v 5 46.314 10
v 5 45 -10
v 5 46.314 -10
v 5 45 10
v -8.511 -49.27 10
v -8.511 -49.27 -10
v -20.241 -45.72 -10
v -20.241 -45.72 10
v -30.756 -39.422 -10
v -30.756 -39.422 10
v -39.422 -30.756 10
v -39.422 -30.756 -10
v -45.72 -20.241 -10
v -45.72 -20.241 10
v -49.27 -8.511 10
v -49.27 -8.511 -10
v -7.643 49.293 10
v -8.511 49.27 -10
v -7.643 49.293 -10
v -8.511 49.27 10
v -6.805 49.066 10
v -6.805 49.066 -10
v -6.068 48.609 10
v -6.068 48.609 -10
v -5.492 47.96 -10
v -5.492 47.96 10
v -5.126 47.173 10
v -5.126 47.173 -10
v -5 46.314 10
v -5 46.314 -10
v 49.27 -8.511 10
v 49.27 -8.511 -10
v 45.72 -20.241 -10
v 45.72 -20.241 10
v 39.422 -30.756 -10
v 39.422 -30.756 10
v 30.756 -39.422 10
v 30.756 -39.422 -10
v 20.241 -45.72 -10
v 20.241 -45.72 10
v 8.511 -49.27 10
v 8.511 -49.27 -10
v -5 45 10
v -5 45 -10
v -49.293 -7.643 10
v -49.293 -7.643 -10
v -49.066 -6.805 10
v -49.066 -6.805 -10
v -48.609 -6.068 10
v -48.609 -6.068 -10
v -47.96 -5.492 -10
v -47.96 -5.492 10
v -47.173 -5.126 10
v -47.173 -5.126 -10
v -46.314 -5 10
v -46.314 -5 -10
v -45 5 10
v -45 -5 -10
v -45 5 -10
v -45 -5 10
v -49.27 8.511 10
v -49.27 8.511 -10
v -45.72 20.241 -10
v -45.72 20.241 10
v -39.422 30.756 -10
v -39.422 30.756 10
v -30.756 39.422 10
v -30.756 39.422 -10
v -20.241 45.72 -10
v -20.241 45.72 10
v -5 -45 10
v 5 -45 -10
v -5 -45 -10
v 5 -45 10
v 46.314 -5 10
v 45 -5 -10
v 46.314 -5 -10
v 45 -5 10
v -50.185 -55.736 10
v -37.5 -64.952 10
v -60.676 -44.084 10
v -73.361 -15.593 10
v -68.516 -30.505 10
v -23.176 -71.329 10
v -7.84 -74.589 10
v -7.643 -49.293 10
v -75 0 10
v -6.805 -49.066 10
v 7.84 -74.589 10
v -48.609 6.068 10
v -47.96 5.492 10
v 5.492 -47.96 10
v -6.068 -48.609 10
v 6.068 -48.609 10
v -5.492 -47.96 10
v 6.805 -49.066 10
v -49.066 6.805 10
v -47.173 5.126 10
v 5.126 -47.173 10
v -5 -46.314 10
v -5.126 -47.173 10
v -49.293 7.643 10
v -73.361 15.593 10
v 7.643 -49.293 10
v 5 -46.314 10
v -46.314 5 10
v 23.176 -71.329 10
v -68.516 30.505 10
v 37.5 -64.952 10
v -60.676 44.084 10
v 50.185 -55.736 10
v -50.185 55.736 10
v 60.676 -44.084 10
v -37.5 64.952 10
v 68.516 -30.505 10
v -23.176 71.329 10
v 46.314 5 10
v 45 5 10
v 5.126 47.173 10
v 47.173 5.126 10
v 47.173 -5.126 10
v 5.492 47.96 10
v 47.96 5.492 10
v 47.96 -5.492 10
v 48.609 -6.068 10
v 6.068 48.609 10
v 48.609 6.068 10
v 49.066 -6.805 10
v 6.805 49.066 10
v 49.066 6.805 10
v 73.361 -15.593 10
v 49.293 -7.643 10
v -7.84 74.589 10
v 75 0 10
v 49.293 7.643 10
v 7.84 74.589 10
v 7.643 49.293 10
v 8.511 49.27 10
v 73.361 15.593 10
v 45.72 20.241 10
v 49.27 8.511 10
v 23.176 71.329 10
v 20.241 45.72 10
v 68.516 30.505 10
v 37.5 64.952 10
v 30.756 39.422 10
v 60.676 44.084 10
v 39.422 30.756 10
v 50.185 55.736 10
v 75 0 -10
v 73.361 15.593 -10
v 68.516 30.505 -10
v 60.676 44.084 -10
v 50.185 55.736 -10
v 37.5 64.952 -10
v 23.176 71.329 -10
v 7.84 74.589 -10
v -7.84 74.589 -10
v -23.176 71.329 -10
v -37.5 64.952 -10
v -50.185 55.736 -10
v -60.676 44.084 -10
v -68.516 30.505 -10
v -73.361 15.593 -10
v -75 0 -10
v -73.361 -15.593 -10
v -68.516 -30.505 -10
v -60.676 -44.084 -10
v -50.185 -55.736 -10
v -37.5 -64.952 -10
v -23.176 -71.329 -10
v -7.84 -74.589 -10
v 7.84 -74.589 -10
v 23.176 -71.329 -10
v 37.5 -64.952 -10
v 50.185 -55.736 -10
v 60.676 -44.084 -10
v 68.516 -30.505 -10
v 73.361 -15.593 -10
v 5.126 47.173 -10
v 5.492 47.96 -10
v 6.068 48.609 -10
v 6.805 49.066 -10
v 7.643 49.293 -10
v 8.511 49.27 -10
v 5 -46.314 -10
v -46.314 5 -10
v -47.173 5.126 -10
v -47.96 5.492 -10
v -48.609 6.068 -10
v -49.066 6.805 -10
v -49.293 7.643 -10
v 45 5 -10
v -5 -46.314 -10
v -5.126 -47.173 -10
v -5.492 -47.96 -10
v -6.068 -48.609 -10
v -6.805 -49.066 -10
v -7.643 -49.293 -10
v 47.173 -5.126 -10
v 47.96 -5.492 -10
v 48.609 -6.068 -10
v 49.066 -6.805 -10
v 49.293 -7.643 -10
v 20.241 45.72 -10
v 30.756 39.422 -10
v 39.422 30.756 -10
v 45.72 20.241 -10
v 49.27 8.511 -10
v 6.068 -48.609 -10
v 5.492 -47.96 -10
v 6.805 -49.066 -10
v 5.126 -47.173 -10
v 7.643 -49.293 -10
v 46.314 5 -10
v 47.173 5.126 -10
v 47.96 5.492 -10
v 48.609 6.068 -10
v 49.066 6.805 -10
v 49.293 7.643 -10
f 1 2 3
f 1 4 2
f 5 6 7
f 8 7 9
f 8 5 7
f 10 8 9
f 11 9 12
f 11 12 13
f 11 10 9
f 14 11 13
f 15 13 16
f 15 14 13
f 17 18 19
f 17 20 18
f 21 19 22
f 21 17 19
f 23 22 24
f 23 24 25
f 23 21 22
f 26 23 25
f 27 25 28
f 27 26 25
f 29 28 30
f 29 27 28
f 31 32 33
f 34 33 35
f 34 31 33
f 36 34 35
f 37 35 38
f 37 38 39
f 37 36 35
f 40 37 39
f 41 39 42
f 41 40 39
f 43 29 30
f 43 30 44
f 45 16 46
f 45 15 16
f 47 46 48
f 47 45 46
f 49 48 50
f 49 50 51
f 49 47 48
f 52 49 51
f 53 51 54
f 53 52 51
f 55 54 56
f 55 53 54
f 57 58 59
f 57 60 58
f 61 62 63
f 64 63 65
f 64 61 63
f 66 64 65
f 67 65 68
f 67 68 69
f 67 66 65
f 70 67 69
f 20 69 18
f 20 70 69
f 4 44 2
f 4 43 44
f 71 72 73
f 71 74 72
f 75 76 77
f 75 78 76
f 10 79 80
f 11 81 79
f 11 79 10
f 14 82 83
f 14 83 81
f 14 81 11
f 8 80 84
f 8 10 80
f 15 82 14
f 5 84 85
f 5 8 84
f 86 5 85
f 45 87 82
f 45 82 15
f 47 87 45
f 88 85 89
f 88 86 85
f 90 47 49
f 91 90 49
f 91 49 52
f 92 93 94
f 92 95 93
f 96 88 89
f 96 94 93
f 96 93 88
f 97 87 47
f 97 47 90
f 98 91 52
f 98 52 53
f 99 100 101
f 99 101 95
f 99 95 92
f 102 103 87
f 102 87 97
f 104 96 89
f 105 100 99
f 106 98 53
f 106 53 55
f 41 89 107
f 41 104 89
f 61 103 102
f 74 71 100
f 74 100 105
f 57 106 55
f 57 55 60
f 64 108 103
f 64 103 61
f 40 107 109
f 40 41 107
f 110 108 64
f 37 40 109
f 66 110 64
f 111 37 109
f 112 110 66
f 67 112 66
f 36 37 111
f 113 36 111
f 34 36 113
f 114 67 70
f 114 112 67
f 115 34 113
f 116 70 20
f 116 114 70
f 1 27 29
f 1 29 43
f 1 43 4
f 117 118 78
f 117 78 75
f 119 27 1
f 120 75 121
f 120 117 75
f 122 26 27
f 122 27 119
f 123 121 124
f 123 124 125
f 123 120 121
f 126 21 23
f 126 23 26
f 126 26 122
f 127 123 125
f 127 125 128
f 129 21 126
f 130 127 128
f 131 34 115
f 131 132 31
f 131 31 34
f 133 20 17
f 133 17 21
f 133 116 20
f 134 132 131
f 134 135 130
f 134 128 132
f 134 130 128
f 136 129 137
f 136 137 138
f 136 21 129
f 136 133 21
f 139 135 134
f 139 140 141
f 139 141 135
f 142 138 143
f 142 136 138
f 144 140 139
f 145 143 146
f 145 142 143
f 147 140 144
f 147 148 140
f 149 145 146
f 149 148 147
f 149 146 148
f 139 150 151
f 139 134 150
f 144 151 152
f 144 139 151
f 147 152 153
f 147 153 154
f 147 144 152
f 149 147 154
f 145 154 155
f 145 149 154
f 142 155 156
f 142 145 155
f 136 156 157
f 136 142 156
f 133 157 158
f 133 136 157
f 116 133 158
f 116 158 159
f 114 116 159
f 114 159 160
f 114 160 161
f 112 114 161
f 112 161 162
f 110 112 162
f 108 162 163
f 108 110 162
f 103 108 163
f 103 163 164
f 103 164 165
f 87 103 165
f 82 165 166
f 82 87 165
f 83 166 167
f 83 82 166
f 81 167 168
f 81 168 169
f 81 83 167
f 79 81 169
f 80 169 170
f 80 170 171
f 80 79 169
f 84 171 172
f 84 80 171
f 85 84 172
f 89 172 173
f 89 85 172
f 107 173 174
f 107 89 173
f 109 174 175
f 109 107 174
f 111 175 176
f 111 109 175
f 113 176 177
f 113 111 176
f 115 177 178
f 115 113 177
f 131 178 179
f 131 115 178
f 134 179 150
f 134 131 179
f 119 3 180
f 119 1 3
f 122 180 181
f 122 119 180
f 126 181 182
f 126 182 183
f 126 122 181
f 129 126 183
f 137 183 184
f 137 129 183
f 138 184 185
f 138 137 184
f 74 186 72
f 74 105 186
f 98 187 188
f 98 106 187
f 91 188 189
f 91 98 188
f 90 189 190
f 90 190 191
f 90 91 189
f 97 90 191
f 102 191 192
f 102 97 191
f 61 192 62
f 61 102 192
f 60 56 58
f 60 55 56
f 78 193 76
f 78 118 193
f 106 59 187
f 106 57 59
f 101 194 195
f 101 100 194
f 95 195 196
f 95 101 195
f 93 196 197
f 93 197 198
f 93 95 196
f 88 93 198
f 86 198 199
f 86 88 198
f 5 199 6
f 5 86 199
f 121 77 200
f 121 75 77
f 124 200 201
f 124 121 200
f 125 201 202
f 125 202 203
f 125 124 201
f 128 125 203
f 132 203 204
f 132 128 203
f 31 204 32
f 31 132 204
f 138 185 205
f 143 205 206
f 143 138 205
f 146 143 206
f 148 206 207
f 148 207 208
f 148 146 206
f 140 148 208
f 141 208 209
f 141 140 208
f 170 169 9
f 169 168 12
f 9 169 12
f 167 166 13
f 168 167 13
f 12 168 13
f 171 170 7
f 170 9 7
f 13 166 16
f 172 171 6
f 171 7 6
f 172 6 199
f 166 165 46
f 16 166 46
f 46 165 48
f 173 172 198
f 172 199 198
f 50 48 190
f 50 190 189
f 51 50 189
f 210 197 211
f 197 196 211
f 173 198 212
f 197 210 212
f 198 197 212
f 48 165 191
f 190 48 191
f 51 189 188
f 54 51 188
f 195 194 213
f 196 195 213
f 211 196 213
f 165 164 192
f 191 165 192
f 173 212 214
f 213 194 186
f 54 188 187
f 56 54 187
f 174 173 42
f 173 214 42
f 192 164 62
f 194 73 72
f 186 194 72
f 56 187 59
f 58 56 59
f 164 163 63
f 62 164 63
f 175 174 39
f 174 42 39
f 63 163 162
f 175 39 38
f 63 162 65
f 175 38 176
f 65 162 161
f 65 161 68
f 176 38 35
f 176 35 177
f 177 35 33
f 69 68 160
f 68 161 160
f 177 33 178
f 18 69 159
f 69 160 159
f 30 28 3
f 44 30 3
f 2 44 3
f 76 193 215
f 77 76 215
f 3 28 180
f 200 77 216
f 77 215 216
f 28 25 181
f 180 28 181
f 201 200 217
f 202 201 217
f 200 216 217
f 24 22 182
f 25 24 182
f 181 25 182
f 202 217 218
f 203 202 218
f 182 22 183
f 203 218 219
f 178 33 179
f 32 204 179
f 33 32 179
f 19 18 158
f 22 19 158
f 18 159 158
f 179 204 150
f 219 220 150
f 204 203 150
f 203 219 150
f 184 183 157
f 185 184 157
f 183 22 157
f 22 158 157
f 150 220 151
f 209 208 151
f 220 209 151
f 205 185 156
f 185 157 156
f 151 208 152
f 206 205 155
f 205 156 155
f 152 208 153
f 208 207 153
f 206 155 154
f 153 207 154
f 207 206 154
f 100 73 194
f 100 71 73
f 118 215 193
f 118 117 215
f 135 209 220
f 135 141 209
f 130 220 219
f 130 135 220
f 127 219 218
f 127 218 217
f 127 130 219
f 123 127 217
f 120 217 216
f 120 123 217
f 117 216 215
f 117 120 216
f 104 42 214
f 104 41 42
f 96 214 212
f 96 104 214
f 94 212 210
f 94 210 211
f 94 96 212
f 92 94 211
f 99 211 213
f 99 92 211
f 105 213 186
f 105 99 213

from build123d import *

# Parameters (mm, degrees)
SKETCH1_R           = 75
BOSS_EXTRUDE1_DEPTH = 10


with BuildPart() as part:
    # Sketch1 → Boss-Extrude1 (new, symmetric)
    with BuildSketch(Plane.XY):
        Circle(SKETCH1_R)
        with BuildLine():
            Line((-5, 46.314144708), (-5, 45))
            Line((-5, 45), (5, 45))
            Line((5, 45), (5, 46.314144708))
            ThreePointArc((5, 46.314144708), (6.067632914, 48.608912113), (8.510638298, 49.27036671))
            ThreePointArc((8.510638298, 49.27036671), (35.355339059, 35.355339059), (49.27036671, 8.510638298))
            ThreePointArc((49.27036671, 8.510638298), (48.608912113, 6.067632914), (46.314144708, 5))
            Line((46.314144708, 5), (45, 5))
            Line((45, 5), (45, -5))
            Line((45, -5), (46.314144708, -5))
            ThreePointArc((46.314144708, -5), (48.608912113, -6.067632914), (49.27036671, -8.510638298))
            ThreePointArc((49.27036671, -8.510638298), (35.355339059, -35.355339059), (8.510638298, -49.27036671))
            ThreePointArc((8.510638298, -49.27036671), (6.067632914, -48.608912113), (5, -46.314144708))
            Line((5, -46.314144708), (5, -45))
            Line((5, -45), (-5, -45))
            Line((-5, -45), (-5, -46.314144708))
            ThreePointArc((-5, -46.314144708), (-6.067632914, -48.608912113), (-8.510638298, -49.27036671))
            ThreePointArc((-8.510638298, -49.27036671), (-35.355339059, -35.355339059), (-49.27036671, -8.510638298))
            ThreePointArc((-49.27036671, -8.510638298), (-48.608912113, -6.067632914), (-46.314144708, -5))
            Line((-46.314144708, -5), (-45, -5))
            Line((-45, -5), (-45, 5))
            Line((-45, 5), (-46.314144708, 5))
            ThreePointArc((-46.314144708, 5), (-48.608912113, 6.067632914), (-49.27036671, 8.510638298))
            ThreePointArc((-49.27036671, 8.510638298), (-35.355339059, 35.355339059), (-8.510638298, 49.27036671))
            ThreePointArc((-8.510638298, 49.27036671), (-6.067632914, 48.608912113), (-5, 46.314144708))
        make_face(mode=Mode.SUBTRACT)
    extrude(amount=BOSS_EXTRUDE1_DEPTH, both=True)


solid = part.part
